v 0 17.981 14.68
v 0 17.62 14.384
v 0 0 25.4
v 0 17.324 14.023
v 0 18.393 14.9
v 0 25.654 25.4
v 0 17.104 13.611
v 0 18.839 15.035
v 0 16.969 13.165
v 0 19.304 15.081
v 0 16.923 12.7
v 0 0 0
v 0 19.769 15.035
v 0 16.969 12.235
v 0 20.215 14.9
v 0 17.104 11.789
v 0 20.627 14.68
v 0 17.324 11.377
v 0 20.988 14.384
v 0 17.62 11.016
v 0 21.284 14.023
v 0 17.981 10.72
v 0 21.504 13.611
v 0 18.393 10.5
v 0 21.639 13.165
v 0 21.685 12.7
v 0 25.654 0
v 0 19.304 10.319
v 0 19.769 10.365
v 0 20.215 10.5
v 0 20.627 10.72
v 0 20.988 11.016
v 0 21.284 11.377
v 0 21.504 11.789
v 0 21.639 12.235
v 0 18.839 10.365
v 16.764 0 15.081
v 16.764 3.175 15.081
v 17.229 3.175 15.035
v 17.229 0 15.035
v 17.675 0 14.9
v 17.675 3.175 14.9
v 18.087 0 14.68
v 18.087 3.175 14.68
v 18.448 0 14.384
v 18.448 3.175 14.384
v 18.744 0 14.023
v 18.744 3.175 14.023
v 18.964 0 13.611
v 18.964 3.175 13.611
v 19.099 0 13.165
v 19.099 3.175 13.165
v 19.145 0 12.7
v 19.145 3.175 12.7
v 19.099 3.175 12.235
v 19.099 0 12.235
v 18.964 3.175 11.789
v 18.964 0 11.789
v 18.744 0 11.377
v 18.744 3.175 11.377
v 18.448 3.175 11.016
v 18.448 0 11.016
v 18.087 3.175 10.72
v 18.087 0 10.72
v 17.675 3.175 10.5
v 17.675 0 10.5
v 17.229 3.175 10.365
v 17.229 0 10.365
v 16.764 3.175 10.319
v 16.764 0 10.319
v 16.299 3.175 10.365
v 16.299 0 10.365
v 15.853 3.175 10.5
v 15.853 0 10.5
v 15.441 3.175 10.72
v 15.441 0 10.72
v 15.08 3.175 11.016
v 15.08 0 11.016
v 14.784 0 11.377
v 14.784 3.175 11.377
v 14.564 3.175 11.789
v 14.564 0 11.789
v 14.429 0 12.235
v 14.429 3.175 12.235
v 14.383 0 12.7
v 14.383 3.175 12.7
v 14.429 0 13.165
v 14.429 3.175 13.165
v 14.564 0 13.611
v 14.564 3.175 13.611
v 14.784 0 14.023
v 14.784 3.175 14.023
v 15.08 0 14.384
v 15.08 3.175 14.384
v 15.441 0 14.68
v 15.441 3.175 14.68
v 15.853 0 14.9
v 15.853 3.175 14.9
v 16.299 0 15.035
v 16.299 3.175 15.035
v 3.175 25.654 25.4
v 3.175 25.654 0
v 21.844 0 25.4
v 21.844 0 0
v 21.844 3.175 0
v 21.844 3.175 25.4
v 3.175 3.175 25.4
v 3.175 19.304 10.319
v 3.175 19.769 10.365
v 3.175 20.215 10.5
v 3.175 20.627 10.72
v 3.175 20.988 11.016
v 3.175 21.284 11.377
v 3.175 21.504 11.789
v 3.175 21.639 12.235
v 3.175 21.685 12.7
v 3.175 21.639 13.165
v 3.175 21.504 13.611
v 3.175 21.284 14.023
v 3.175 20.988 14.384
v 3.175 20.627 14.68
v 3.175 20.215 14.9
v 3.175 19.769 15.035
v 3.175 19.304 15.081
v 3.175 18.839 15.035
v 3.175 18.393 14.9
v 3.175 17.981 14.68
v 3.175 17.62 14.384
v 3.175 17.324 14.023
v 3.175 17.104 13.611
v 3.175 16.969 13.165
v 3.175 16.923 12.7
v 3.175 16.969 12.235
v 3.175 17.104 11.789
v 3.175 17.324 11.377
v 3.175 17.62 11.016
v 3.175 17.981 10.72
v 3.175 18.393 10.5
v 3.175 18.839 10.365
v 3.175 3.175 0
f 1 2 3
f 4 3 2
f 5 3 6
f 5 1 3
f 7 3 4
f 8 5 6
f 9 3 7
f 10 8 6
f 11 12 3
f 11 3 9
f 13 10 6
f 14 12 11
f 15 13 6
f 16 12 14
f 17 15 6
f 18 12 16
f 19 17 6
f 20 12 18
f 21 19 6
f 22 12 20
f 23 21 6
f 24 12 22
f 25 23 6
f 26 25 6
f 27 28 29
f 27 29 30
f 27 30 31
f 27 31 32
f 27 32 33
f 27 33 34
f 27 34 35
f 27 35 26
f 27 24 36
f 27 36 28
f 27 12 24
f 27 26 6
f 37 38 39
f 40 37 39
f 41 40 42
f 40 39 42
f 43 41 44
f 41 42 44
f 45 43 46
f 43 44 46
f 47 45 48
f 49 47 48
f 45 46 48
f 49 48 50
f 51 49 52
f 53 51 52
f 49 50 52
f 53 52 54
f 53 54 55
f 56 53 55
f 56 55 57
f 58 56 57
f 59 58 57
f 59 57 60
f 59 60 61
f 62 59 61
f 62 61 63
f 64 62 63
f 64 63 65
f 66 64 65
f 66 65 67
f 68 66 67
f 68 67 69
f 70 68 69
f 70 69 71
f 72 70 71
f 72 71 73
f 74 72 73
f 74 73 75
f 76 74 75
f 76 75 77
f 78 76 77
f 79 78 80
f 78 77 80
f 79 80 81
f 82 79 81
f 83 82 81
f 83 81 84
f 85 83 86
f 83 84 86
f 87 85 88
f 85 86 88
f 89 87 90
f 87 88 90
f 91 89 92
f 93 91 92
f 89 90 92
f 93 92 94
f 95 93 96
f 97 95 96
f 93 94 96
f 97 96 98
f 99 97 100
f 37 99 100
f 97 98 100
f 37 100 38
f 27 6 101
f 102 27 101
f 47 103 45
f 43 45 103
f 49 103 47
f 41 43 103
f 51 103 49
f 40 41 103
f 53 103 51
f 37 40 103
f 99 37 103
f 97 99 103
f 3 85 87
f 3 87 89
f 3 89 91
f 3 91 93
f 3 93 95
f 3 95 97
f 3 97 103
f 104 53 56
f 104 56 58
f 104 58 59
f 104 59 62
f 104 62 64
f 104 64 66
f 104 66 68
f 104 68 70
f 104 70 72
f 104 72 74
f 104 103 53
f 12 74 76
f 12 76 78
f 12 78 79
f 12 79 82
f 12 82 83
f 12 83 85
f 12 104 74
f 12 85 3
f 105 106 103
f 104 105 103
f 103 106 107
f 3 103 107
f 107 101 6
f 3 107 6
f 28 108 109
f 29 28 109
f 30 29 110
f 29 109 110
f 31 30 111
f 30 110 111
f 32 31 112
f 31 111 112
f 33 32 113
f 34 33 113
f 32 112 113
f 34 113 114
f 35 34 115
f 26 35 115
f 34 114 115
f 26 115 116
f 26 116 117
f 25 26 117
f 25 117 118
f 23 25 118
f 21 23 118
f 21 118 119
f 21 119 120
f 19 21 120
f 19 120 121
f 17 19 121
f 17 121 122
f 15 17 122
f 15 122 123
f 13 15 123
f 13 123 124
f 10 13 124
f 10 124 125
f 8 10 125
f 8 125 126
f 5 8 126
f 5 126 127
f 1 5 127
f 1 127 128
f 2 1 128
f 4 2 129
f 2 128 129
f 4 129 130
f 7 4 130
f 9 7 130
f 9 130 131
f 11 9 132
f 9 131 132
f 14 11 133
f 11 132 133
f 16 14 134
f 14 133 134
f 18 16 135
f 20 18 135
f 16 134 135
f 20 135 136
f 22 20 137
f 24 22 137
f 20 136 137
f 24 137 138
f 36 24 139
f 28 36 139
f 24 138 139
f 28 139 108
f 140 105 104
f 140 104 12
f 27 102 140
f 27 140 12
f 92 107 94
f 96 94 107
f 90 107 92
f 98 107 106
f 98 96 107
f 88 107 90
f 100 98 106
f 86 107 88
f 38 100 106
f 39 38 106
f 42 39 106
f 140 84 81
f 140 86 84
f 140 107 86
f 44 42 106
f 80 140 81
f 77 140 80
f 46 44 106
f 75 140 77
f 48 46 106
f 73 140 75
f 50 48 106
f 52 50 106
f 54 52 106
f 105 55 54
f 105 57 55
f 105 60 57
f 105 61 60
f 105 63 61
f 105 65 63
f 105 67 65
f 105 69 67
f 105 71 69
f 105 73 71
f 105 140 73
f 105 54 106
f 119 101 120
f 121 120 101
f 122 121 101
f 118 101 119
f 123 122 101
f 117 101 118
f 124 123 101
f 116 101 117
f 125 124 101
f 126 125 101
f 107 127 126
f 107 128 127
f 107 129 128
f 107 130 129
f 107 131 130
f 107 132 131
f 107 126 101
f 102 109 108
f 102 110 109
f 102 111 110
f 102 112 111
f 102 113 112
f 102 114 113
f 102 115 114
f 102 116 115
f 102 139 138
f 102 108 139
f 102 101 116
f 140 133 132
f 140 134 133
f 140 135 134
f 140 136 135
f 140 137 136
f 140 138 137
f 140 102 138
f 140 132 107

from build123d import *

# Parameters (mm, degrees)
BOSS_EXTRUDE1_DEPTH = 25.4
SKETCH2_R           = 2.38125
CUT_EXTRUDE1_DEPTH  = 41.642579606
SKETCH3_R           = 2.38125
CUT_EXTRUDE2_DEPTH  = 41.343844351


with BuildPart() as part:
    # Sketch1 → Boss-Extrude1 (new body)
    with BuildSketch(Plane.XY):
        Polygon((0, 0), (0, 25.654), (3.175, 25.654), (3.175, 3.175), (21.844, 3.175), (21.844, 0), align=None)
    extrude(amount=BOSS_EXTRUDE1_DEPTH)

    # Sketch2 → Cut-Extrude1 (cut, through all)
    with BuildSketch(Plane(origin=(3.175, 0, 0), x_dir=(0, 0, -1), z_dir=(1, 0, 0))):
        with Locations((-12.7, 19.304)):
            Circle(SKETCH2_R)
    extrude(amount=-CUT_EXTRUDE1_DEPTH, mode=Mode.SUBTRACT)

    # Sketch3 → Cut-Extrude2 (cut, through all)
    with BuildSketch(Plane(origin=(0, 3.175, 0), x_dir=(1, 0, 0), z_dir=(0, 1, 0))):
        with Locations(Location((16.764, -12.7, 0), (0, 0, 270))):
            Circle(SKETCH3_R)
    extrude(amount=-CUT_EXTRUDE2_DEPTH, mode=Mode.SUBTRACT)


solid = part.part
